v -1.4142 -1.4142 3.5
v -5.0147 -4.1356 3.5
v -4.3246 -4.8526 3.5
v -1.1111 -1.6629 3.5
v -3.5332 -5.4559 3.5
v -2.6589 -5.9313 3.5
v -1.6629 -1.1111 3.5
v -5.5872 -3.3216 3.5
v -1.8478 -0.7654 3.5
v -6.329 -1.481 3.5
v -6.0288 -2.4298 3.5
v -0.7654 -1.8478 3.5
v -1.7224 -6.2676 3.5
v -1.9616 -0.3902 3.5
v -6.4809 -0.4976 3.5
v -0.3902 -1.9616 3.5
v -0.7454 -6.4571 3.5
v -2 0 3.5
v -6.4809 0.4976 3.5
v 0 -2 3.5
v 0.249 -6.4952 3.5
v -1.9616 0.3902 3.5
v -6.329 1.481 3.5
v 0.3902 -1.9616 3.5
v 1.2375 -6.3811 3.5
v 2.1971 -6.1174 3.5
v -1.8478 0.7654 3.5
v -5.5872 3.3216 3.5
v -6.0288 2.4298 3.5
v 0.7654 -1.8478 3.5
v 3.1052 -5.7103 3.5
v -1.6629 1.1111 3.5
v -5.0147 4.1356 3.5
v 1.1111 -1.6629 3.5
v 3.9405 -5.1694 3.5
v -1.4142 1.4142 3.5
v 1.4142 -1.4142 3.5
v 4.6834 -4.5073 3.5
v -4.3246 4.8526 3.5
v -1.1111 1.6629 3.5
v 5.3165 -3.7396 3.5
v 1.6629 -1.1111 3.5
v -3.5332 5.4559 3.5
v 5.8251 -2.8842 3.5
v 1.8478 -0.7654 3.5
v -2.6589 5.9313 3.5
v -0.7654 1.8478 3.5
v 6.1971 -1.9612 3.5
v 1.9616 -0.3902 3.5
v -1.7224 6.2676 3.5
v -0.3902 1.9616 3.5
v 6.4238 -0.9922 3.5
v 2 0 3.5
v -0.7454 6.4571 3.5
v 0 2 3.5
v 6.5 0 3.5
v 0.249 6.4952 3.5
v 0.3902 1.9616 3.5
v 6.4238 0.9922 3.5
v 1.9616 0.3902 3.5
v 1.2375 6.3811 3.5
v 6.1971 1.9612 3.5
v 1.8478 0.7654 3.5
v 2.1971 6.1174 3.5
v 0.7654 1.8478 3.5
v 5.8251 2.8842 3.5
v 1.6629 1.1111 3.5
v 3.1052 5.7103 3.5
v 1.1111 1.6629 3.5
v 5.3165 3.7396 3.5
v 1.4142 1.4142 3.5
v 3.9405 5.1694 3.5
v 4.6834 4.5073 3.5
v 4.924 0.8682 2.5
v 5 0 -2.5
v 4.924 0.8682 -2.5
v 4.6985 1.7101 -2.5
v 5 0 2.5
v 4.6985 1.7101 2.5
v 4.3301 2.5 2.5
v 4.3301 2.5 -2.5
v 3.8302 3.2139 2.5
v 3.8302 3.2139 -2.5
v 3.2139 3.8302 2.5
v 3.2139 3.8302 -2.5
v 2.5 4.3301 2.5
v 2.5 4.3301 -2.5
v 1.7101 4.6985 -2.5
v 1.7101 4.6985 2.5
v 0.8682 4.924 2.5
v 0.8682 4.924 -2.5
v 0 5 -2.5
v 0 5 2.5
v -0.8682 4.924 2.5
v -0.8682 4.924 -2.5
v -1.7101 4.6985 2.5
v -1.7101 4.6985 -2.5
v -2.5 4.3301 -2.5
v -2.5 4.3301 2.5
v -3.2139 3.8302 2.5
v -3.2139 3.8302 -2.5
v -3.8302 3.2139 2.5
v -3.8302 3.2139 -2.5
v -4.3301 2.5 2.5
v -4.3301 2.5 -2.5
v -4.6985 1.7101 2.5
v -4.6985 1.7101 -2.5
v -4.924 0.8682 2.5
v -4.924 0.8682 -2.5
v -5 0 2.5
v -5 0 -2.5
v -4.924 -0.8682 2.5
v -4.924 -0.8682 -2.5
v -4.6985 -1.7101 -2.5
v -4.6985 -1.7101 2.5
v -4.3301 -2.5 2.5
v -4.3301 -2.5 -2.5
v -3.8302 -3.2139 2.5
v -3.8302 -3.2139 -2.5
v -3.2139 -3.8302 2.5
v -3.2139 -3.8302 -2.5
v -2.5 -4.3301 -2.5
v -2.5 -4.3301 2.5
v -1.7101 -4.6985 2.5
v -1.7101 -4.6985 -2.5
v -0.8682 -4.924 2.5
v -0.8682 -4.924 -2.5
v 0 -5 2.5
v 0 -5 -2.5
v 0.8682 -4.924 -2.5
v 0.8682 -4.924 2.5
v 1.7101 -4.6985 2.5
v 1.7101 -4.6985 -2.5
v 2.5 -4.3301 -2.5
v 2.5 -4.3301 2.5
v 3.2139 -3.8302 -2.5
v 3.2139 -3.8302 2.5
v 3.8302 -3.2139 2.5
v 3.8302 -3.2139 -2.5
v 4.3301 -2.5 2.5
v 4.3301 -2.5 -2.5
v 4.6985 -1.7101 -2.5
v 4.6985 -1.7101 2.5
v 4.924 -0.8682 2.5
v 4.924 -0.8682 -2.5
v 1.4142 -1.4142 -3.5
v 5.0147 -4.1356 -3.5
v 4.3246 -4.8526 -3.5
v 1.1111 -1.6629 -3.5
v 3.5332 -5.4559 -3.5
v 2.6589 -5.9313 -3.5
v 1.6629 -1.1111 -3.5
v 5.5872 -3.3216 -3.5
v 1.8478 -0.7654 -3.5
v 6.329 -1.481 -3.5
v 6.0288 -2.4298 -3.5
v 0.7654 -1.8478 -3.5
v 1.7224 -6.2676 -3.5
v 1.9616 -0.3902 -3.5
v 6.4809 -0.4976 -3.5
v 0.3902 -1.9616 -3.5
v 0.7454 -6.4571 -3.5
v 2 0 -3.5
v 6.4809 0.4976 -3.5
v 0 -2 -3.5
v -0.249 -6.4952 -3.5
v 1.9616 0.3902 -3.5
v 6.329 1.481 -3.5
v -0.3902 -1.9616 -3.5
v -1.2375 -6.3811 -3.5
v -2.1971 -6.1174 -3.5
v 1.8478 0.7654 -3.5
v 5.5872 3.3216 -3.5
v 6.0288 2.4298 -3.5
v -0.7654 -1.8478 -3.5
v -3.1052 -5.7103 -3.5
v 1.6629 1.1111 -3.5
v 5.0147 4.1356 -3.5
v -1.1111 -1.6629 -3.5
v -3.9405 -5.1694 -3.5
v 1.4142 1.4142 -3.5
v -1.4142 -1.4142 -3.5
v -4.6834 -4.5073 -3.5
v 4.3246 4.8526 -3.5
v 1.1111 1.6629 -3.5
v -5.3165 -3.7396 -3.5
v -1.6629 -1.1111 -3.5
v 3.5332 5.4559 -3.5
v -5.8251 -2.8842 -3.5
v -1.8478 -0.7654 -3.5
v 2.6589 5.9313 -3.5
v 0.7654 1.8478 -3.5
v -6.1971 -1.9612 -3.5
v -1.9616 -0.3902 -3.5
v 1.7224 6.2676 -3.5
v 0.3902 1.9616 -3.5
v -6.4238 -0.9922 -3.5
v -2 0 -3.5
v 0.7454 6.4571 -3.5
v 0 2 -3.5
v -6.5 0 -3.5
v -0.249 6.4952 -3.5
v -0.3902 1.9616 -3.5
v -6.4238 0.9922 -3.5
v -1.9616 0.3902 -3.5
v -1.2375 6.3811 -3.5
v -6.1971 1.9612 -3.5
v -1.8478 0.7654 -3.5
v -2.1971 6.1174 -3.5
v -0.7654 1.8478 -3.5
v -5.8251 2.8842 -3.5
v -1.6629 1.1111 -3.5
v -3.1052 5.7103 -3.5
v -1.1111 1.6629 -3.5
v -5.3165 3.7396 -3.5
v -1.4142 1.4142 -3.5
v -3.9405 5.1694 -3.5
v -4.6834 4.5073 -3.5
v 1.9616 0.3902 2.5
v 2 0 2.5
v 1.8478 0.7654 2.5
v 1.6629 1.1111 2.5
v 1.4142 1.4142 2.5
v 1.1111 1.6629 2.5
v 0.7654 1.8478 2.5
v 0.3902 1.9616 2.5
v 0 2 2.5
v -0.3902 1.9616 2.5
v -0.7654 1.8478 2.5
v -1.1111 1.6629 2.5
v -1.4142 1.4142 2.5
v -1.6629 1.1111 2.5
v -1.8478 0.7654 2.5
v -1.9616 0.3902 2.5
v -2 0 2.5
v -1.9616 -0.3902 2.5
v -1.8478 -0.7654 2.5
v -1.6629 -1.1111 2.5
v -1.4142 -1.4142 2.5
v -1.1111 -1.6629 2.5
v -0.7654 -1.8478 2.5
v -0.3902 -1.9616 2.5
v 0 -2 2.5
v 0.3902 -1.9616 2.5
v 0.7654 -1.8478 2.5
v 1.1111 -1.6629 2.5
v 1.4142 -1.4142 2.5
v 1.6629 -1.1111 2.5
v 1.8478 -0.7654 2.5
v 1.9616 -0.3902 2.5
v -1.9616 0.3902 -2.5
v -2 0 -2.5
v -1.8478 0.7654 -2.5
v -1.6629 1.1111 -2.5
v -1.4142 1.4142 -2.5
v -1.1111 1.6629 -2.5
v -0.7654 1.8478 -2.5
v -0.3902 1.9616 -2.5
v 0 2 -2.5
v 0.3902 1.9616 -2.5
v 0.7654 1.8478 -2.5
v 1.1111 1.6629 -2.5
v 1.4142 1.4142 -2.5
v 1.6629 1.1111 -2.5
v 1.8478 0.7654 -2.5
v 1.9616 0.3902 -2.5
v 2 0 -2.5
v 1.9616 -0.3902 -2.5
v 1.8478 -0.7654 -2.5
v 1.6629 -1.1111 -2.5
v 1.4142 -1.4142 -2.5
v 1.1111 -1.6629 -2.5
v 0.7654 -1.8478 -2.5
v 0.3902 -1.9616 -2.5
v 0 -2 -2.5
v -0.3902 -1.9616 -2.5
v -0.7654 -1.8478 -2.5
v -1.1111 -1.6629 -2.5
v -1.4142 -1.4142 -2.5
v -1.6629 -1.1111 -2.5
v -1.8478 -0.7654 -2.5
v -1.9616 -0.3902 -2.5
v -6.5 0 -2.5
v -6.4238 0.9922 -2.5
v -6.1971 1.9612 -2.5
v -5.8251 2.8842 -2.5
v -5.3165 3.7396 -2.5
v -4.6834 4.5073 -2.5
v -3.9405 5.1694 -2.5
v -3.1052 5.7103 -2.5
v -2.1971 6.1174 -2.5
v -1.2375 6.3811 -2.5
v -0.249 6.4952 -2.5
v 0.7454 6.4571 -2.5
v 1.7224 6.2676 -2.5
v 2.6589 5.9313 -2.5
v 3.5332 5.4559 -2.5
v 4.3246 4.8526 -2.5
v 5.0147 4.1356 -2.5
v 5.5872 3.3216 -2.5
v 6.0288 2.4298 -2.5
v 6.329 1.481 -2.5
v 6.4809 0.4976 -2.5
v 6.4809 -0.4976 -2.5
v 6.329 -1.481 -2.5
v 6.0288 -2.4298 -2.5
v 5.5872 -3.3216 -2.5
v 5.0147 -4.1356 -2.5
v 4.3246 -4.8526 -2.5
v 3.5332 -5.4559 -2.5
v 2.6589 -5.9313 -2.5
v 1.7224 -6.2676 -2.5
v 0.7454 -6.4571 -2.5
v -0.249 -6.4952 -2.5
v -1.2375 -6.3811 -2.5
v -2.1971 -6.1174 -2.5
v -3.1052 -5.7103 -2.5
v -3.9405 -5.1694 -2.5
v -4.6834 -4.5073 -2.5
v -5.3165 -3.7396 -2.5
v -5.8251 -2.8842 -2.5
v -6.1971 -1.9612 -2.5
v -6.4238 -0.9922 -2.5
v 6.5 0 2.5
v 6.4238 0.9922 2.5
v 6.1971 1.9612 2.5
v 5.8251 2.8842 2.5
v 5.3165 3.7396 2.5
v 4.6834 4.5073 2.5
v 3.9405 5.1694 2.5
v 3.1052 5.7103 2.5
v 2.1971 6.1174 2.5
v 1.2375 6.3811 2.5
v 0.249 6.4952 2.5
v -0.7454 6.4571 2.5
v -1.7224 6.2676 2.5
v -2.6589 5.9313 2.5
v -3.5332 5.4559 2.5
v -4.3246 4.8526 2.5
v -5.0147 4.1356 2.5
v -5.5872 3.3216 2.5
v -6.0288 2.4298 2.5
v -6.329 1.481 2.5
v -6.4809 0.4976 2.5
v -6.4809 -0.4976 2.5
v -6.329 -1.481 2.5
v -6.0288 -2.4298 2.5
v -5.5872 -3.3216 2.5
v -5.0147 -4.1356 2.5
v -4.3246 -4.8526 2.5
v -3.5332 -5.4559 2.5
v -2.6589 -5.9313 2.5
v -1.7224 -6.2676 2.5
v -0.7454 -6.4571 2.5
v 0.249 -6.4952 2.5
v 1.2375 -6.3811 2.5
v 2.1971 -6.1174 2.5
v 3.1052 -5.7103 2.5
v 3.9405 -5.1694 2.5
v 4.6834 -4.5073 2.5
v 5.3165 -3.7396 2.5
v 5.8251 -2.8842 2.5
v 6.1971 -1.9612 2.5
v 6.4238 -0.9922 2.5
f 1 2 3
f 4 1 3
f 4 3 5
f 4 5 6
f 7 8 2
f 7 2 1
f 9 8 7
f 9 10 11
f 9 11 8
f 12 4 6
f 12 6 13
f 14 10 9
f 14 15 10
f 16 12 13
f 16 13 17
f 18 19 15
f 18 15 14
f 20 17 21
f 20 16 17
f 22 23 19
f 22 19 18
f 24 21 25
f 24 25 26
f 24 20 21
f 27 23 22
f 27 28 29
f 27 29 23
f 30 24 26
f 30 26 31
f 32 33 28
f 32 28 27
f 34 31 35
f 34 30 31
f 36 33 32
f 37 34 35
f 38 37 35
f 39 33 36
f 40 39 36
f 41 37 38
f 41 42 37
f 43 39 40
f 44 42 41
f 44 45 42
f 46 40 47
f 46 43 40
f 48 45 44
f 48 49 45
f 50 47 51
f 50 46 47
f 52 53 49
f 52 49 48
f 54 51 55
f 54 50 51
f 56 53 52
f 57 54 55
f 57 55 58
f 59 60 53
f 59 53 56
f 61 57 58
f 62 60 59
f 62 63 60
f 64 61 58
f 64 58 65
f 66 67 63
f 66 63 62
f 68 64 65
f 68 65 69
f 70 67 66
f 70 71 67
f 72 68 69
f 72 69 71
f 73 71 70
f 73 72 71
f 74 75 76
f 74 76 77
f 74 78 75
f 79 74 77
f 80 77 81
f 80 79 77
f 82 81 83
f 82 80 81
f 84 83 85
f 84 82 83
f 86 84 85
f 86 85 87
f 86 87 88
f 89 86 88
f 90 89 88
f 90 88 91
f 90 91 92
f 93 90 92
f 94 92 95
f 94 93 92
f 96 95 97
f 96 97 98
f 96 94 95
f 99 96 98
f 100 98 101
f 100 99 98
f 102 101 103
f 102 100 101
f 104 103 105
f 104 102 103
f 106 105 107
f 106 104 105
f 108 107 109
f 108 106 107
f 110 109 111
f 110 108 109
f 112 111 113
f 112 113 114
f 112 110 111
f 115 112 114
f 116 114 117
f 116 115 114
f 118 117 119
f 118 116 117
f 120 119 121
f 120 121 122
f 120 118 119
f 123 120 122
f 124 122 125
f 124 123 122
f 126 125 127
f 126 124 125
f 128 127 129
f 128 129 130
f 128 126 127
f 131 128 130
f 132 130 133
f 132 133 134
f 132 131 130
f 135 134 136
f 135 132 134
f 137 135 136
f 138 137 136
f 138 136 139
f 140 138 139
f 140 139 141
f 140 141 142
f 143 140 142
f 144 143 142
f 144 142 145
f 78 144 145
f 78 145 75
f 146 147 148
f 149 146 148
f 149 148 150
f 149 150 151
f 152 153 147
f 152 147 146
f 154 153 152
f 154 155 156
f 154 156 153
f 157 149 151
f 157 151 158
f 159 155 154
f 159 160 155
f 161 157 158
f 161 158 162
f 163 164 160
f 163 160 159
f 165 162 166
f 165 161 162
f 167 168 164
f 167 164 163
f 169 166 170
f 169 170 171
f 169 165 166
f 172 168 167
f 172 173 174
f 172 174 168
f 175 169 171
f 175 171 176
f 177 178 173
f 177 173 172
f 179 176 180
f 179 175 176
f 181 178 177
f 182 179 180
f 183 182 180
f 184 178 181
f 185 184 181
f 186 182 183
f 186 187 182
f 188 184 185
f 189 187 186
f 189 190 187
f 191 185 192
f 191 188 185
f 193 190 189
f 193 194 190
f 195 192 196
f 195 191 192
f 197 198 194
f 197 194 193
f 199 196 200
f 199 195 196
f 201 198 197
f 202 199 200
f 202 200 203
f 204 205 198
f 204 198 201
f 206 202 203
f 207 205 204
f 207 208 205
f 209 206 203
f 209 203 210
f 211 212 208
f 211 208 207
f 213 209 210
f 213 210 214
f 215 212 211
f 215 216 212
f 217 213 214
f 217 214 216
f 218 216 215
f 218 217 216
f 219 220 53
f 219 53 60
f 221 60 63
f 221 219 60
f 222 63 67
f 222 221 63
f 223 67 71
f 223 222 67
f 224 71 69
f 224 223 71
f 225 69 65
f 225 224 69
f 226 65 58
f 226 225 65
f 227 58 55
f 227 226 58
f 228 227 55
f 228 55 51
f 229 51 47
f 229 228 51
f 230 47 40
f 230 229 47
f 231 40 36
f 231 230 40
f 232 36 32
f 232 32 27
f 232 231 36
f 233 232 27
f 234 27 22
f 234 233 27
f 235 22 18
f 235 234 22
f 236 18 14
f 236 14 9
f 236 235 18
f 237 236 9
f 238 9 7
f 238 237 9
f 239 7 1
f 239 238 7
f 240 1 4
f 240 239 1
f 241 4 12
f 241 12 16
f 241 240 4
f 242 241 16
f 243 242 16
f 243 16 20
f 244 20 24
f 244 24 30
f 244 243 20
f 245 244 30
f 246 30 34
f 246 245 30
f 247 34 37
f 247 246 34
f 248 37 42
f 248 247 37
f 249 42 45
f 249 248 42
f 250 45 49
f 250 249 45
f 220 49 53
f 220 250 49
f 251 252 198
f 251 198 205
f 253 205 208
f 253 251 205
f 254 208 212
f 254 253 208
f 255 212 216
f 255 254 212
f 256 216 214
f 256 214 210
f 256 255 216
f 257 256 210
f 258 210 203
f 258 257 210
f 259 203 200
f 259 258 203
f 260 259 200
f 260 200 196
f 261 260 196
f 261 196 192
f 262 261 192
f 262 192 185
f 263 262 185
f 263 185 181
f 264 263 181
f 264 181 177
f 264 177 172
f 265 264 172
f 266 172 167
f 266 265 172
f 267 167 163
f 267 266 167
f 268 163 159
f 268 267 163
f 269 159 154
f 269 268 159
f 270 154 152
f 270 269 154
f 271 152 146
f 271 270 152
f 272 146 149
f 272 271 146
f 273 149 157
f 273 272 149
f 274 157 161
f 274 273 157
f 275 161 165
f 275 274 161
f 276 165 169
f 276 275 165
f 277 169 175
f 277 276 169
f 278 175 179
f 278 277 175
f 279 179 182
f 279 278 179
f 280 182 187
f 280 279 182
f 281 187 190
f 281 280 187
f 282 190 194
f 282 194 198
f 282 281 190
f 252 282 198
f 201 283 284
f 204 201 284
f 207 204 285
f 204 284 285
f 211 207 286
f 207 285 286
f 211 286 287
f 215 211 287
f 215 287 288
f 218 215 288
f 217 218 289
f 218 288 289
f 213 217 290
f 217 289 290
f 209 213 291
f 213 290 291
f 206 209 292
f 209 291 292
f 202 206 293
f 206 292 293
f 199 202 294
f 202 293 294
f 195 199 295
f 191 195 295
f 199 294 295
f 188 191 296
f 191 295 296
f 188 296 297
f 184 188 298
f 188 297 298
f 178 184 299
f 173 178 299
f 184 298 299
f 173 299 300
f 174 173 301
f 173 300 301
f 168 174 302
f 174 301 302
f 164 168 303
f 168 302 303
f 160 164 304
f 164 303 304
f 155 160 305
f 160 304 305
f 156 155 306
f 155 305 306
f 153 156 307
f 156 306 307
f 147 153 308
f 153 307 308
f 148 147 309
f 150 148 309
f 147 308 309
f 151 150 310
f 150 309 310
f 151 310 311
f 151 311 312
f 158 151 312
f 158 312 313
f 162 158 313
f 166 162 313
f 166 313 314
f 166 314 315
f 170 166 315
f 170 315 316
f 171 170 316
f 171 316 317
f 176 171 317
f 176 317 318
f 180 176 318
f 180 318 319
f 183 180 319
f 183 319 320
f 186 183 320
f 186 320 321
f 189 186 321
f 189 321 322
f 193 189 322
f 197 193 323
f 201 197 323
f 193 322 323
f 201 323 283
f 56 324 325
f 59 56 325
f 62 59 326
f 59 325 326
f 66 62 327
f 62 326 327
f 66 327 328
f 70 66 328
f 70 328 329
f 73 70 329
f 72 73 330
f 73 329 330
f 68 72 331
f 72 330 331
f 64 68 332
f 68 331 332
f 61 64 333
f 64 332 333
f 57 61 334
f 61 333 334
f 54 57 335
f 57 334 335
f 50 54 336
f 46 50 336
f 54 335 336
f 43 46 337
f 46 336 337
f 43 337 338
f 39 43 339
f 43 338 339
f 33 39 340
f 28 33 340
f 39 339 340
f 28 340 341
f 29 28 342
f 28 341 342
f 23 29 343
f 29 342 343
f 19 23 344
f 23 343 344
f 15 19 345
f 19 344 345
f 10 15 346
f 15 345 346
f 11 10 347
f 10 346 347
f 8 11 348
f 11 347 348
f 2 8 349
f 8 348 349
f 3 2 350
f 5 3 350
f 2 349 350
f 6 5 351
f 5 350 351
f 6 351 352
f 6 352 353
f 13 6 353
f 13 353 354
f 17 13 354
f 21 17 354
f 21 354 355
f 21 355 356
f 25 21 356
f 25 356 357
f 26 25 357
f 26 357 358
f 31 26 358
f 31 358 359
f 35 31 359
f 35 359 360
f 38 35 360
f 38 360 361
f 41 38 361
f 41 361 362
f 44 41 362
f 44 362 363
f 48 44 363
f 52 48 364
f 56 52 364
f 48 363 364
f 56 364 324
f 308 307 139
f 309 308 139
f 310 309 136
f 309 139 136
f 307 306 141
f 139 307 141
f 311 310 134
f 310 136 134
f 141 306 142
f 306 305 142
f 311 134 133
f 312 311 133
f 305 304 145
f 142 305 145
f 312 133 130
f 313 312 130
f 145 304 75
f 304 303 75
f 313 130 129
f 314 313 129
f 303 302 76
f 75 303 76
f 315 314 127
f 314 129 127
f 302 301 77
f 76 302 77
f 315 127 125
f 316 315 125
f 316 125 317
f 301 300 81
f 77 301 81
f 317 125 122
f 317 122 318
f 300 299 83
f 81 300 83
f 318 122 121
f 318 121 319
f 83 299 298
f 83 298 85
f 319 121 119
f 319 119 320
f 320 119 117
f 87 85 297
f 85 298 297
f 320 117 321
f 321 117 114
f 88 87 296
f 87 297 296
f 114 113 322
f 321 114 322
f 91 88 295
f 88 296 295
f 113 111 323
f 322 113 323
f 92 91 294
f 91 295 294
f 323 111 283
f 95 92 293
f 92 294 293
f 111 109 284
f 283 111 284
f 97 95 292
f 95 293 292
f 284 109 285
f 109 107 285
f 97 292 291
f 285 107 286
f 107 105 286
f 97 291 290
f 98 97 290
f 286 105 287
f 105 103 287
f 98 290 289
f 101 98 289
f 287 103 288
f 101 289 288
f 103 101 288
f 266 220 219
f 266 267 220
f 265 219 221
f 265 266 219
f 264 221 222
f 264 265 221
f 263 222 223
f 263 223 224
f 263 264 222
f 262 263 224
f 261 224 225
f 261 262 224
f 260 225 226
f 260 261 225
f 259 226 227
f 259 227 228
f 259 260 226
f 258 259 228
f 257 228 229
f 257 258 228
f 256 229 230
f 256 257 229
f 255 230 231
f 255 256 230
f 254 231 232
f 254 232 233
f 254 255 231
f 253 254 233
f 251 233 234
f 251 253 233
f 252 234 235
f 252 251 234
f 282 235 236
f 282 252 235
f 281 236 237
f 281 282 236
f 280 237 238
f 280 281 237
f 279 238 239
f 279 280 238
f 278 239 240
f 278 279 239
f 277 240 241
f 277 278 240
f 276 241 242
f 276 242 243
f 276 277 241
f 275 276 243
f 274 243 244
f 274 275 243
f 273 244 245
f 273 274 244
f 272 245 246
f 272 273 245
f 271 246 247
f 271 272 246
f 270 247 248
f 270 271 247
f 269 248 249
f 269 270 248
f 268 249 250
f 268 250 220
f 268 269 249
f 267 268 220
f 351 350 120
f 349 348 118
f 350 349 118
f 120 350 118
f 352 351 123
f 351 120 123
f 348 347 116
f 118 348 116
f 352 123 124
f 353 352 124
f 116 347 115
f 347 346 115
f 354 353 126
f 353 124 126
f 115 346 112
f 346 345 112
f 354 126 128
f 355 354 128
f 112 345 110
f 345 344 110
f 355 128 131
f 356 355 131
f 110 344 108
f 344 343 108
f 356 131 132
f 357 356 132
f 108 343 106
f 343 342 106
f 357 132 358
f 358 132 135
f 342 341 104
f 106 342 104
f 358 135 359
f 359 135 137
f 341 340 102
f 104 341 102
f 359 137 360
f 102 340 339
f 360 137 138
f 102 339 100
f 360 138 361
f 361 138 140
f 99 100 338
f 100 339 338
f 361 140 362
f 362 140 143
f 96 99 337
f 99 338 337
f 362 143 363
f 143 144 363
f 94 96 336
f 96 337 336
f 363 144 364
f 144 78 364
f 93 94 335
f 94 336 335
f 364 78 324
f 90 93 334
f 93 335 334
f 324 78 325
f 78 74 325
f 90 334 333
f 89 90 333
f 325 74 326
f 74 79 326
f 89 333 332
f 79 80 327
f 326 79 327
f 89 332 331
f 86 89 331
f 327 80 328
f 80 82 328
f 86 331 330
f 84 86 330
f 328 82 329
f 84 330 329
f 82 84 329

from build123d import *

# Parameters (mm, degrees)
SKETCH_1_R      = 5
SKETCH_1_R_2    = 2
EXTRUDE_1_DEPTH = 2.5
SKETCH_2_R      = 6.5
SKETCH_2_R_2    = 2
EXTRUDE_2_DEPTH = 1
SKETCH_3_R      = 6.5
SKETCH_3_R_2    = 2
EXTRUDE_3_DEPTH = 1


with BuildPart() as part:
    # 스케치1 → 보스-돌출1 (new body, symmetric)
    with BuildSketch(Plane.XY):
        Circle(SKETCH_1_R)
        Circle(SKETCH_1_R_2, mode=Mode.SUBTRACT)
    extrude(amount=EXTRUDE_1_DEPTH, both=True)

    # 스케치2 → 보스-돌출2 (add)
    with BuildSketch(Plane(origin=(0, 0, -2.5), x_dir=(-1, 0, 0), z_dir=(0, 0, -1))):
        Circle(SKETCH_2_R)
        Circle(SKETCH_2_R_2, mode=Mode.SUBTRACT)
    extrude(amount=EXTRUDE_2_DEPTH)

    # 스케치3 → 보스-돌출3 (add)
    with BuildSketch(Plane.XY.offset(2.5)):
        Circle(SKETCH_3_R)
        Circle(SKETCH_3_R_2, mode=Mode.SUBTRACT)
    extrude(amount=EXTRUDE_3_DEPTH)


solid = part.part
